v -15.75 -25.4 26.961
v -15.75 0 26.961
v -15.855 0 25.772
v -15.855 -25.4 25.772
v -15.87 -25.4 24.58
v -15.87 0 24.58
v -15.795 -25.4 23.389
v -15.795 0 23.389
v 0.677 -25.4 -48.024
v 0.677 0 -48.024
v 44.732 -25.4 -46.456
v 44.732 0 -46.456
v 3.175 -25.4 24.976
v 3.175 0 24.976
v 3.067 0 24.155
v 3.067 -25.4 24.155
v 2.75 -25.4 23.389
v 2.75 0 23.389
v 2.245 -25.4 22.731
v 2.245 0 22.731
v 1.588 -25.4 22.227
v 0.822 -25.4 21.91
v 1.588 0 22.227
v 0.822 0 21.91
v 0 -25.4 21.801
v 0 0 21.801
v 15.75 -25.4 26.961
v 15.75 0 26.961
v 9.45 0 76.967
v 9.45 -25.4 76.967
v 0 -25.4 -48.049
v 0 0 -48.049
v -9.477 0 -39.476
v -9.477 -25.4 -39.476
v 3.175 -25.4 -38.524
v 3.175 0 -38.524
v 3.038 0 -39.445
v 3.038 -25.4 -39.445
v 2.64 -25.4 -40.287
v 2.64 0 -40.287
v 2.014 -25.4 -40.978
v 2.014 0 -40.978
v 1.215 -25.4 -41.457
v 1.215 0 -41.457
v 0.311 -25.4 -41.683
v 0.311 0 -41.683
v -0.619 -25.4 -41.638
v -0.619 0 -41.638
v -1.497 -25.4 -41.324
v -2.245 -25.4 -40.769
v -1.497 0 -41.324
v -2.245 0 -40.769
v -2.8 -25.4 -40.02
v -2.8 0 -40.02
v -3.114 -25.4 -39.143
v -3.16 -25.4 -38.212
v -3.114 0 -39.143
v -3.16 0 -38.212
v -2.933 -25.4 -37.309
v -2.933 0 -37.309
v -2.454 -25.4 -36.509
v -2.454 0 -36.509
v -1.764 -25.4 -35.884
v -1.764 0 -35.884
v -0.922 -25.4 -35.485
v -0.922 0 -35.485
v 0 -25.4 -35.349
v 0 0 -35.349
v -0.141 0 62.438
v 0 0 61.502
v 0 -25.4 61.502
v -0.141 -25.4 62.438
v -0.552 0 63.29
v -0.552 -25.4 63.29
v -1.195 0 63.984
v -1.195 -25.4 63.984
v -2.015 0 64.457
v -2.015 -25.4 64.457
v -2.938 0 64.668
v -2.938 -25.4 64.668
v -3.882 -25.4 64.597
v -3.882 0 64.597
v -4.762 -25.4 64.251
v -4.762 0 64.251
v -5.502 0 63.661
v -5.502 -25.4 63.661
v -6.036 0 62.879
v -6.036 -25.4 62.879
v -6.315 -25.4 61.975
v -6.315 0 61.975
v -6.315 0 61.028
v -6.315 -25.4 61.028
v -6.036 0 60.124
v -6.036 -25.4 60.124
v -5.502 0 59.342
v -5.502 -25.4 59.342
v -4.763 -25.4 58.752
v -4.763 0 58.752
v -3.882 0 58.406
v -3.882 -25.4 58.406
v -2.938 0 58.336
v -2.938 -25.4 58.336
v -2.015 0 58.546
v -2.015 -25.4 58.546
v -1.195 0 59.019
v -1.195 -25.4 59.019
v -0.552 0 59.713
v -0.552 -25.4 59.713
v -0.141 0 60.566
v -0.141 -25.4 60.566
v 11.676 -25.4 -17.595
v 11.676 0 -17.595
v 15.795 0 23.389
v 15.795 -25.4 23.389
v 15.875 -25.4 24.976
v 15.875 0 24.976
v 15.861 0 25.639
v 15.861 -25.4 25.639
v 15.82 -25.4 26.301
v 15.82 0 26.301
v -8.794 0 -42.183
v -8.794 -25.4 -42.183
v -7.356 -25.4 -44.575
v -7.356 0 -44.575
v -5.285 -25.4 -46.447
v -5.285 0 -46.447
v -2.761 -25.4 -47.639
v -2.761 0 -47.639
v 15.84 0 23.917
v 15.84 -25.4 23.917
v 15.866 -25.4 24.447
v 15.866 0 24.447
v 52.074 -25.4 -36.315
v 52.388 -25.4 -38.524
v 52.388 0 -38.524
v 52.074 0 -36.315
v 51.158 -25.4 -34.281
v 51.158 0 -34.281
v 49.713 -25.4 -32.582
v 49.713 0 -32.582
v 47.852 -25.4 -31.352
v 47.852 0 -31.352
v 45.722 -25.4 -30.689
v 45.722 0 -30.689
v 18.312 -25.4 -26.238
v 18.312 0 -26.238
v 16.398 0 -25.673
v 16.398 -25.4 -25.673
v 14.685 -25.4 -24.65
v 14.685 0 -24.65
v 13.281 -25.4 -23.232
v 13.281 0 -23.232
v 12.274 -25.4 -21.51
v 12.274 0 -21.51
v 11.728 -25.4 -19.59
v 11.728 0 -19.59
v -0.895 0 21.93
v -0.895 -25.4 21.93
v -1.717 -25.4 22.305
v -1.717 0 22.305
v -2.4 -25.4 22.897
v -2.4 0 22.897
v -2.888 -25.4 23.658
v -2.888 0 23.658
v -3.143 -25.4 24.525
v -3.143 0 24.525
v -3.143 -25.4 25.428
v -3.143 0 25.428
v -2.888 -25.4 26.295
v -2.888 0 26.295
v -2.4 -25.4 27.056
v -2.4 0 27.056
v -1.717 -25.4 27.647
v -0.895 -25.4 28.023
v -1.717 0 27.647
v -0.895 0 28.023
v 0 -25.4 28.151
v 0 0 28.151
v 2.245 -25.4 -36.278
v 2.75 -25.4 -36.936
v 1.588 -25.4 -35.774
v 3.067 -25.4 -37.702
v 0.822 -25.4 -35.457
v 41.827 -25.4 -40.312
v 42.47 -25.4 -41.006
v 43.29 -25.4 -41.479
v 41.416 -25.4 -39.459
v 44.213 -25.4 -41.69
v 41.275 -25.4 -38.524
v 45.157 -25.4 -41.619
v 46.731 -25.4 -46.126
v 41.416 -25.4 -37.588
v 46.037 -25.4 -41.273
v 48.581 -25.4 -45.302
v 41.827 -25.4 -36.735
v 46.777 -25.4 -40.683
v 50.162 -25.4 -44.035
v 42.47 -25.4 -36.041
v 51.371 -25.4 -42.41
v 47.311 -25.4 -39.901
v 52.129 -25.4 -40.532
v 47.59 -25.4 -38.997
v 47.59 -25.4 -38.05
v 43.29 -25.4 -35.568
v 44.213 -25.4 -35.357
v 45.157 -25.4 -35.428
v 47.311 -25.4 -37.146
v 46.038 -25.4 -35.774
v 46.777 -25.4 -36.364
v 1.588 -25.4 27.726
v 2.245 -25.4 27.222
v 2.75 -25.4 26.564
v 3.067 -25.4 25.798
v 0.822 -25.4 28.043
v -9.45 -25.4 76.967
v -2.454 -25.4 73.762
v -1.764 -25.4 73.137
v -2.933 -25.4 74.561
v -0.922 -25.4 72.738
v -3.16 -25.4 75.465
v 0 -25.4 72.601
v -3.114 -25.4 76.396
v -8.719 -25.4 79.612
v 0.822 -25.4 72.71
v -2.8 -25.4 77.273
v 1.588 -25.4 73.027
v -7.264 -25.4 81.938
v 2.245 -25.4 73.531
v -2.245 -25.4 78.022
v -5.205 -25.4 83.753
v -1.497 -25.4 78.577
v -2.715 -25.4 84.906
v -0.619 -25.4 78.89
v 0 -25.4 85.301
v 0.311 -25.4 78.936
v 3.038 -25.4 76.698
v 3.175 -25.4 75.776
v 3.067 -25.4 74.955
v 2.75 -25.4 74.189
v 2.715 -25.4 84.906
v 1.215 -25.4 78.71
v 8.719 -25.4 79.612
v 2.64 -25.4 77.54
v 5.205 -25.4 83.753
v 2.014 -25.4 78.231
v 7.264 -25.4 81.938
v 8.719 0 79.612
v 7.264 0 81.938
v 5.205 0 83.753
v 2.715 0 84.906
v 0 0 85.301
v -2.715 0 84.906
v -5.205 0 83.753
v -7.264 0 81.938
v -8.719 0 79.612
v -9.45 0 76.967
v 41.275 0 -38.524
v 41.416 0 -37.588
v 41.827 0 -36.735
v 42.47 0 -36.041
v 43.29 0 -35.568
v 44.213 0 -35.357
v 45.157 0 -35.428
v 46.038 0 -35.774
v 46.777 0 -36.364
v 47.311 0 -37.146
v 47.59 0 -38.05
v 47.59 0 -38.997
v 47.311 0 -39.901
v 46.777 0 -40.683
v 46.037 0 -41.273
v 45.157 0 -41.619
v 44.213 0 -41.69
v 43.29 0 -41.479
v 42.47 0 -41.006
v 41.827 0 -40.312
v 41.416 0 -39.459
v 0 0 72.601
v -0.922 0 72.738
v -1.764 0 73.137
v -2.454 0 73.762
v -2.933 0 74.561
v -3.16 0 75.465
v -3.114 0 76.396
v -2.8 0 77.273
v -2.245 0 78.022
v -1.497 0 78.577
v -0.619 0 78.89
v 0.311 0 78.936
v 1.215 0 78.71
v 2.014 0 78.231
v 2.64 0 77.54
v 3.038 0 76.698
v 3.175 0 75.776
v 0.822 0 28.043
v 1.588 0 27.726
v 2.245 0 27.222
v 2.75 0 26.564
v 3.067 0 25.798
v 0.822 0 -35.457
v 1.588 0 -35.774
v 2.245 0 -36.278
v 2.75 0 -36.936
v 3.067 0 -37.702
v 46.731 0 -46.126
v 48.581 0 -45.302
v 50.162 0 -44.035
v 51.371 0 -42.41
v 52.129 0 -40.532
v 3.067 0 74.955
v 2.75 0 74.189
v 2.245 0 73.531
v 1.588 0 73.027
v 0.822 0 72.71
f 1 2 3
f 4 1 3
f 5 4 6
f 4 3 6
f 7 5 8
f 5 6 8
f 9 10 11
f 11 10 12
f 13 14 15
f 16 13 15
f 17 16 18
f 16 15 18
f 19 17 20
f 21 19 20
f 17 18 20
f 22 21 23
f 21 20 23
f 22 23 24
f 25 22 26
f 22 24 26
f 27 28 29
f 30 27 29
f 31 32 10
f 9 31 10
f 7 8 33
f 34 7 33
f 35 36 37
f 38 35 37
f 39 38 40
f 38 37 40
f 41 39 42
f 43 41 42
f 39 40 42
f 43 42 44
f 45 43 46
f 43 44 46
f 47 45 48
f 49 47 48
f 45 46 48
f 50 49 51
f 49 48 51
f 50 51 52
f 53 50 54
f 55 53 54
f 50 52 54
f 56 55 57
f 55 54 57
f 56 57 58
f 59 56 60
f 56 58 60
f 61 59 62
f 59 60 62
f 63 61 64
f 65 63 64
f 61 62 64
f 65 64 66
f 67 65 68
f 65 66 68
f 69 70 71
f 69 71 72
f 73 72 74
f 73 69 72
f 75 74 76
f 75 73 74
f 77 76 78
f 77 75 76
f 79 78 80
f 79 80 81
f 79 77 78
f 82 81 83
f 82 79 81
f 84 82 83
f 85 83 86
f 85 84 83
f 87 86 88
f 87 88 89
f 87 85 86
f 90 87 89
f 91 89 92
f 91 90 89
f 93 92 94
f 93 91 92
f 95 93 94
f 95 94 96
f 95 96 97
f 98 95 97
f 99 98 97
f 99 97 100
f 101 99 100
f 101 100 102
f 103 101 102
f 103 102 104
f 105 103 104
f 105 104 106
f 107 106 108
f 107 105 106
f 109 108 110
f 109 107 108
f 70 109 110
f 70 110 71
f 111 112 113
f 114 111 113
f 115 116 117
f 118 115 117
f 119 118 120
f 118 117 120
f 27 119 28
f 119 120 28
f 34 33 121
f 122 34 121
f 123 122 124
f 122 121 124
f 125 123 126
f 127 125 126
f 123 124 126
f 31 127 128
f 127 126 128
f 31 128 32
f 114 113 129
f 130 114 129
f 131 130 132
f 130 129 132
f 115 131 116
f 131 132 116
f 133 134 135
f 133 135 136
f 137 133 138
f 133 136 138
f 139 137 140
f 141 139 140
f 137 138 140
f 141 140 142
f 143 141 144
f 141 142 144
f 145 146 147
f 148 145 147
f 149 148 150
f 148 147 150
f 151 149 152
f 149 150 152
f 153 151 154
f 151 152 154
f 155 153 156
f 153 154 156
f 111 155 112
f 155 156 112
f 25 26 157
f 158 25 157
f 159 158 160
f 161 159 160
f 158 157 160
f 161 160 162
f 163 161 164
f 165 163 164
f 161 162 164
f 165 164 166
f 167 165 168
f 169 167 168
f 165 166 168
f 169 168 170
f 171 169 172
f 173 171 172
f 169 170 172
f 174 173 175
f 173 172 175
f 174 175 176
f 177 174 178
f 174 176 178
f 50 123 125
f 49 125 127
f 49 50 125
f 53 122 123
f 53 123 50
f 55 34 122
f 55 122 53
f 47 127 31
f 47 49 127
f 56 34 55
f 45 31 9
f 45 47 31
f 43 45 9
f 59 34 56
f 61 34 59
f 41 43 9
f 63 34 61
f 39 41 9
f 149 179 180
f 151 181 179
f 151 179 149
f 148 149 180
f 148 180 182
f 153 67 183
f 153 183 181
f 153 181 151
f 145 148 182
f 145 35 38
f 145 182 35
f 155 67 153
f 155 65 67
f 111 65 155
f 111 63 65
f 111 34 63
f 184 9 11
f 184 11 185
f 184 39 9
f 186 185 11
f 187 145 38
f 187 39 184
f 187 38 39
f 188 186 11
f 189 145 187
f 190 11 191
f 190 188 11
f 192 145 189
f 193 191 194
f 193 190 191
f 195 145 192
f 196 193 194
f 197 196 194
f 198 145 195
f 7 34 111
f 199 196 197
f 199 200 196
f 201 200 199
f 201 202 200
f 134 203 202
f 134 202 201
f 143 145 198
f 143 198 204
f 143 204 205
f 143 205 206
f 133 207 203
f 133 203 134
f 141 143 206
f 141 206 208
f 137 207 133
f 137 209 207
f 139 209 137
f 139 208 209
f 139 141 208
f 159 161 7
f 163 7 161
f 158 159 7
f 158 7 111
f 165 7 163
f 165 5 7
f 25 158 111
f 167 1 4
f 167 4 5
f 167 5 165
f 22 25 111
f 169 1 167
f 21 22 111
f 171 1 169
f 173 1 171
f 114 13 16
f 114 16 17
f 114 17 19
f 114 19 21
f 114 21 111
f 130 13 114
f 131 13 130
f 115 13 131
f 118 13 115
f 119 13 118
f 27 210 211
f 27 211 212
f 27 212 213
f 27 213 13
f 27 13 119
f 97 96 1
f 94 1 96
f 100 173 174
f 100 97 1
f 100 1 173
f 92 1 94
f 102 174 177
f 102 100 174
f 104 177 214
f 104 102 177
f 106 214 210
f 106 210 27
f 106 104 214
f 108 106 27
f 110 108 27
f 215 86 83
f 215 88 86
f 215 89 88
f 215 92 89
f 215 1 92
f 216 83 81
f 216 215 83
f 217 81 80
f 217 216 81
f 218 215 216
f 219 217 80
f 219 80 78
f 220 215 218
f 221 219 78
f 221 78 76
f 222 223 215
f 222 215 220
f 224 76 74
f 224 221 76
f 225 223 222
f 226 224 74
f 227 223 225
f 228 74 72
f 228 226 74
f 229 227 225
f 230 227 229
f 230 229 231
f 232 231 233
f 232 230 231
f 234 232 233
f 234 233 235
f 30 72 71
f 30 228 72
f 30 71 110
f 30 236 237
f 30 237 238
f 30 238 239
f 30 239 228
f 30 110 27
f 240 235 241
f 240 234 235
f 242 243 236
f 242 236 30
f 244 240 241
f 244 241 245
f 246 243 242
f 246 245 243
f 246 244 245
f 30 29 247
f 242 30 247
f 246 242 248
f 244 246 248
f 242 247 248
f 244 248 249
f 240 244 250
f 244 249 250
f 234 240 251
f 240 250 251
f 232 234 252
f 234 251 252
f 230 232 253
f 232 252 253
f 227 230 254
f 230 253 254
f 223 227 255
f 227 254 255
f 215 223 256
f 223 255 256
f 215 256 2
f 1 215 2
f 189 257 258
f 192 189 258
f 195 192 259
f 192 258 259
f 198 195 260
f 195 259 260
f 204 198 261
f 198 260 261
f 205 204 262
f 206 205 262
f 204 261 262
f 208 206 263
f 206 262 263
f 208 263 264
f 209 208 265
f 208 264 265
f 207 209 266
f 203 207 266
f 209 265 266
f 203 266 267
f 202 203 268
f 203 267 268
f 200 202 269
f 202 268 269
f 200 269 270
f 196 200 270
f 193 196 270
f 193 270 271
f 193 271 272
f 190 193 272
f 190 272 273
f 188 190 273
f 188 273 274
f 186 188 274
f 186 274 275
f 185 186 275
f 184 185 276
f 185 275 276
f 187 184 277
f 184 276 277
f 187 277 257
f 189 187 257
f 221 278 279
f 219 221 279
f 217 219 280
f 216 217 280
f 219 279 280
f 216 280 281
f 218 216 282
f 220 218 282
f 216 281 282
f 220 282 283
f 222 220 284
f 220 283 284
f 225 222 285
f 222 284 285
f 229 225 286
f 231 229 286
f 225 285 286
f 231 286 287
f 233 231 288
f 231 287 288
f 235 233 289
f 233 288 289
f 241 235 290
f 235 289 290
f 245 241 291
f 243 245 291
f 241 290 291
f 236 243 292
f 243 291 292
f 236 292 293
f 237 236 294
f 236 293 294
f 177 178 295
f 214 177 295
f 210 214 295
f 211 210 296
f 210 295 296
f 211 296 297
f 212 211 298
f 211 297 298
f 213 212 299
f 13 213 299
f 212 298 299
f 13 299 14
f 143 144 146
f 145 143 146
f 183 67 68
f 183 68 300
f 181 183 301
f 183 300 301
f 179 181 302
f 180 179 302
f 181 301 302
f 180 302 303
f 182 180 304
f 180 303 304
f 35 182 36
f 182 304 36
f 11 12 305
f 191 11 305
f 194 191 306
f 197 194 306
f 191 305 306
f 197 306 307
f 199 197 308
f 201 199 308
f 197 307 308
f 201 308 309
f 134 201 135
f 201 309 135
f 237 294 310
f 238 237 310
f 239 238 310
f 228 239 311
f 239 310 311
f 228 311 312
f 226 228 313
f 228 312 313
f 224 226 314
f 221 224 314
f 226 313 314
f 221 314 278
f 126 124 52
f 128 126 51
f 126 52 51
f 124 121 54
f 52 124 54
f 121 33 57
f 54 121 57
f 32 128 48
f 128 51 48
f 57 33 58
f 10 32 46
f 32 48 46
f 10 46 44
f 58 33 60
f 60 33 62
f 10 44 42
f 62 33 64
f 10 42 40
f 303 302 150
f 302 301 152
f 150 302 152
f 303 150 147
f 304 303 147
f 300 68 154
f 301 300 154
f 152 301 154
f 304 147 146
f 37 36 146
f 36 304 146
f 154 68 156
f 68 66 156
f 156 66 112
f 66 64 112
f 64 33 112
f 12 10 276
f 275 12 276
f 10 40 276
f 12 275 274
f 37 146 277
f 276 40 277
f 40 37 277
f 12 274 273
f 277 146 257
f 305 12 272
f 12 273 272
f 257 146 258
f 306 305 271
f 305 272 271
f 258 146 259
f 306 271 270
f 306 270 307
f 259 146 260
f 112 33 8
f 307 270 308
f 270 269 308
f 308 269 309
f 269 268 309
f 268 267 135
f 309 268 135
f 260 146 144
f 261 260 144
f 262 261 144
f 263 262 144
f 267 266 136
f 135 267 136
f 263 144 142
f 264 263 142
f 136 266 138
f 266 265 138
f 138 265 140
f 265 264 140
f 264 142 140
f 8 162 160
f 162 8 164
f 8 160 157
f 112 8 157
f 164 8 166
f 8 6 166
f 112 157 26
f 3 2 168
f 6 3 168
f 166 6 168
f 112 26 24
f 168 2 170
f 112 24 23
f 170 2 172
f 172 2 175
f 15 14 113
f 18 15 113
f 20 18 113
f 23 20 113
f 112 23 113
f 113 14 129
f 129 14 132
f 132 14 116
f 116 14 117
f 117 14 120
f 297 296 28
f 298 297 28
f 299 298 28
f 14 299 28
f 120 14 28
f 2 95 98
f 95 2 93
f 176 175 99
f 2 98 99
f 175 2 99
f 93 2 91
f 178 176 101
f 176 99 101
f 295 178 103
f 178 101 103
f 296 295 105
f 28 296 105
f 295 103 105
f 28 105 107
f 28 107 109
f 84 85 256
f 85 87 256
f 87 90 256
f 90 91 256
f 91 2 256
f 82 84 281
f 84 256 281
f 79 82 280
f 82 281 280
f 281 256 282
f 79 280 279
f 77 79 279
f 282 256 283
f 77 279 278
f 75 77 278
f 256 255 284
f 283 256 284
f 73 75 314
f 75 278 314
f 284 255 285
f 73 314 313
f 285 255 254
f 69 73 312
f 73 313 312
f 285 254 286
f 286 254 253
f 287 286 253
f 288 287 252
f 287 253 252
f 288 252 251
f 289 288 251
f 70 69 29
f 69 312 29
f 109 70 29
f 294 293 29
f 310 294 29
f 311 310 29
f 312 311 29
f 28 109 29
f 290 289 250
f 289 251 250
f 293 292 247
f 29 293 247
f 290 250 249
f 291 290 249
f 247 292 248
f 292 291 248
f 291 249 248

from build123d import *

# Parameters (mm, degrees)
F0_R     = 3.175
F1_DEPTH = 25.4


# Not quite as in the source:
# - a feature of the source that left no trace in its solid (it failed there, or was rolled back) is left out


with BuildPart() as f1:
    # F0 (on Front) → F1 (new body)
    with BuildSketch(Plane.XZ):
        with BuildLine():
            ThreePointArc((9.525, 75.7764706288), (6.7351920908, 69.041278538), (0, 66.2514706288))
            Line((0, 66.2514706288), (0, 61.5016706288))
            Line((0, 61.5016706288), (0, 40.8514706288))
            ThreePointArc((0, 40.8514706288), (10.5003255158, 36.8827206288), (15.7504882737, 26.9608456288))
            Line((15.7504882737, 26.9608456288), (9.4502929642, 76.9670956288))
            ThreePointArc((9.4502929642, 76.9670956288), (9.5063048942, 76.3729538708), (9.525, 75.7764706288))
        make_face()
        with BuildLine():
            ThreePointArc((-9.4502929642, 76.9670956288), (-7.14375, 69.4762753193), (0, 66.2514706288))
            ThreePointArc((0, 66.2514706288), (6.7351920908, 69.041278538), (9.525, 75.7764706288))
            ThreePointArc((9.525, 75.7764706288), (9.5063048942, 76.3729538708), (9.4502929642, 76.9670956288))
            ThreePointArc((9.4502929642, 76.9670956288), (0, 85.3014706288), (-9.4502929642, 76.9670956288))
        make_face()
        with BuildLine():
            ThreePointArc((3.175, 75.7764706288), (2.2450640303, 73.5314065985), (0, 72.6014706288))
            ThreePointArc((0, 72.6014706288), (-2.2450640303, 78.0215346591), (3.175, 75.7764706288))
        make_face(mode=Mode.SUBTRACT)
        with BuildLine():
            Line((0, 61.5016706288), (0, 66.2514706288))
            ThreePointArc((0, 66.2514706288), (-7.14375, 69.4762753193), (-9.4502929642, 76.9670956288))
            Line((-9.4502929642, 76.9670956288), (-15.7504882737, 26.9608456288))
            ThreePointArc((-15.7504882737, 26.9608456288), (-10.5003255158, 36.8827206288), (0, 40.8514706288))
            Line((0, 40.8514706288), (0, 61.5016706288))
        make_face()
        with Locations((-3.175, 61.5016706288)):
            Circle(F0_R, mode=Mode.SUBTRACT)
        with BuildLine():
            Line((0, 28.1514706288), (0, 40.8514706288))
            ThreePointArc((0, 40.8514706288), (-10.5003255158, 36.8827206288), (-15.7504882737, 26.9608456288))
            ThreePointArc((-15.7504882737, 26.9608456288), (-15.8737438155, 25.1761761155), (-15.7954255641, 23.3889706288))
            ThreePointArc((-15.7954255641, 23.3889706288), (-10.6492737428, 13.2032555305), (0, 9.1014706288))
            Line((0, 9.1014706288), (0, 21.8014706288))
            ThreePointArc((0, 21.8014706288), (-3.175, 24.9764706288), (0, 28.1514706288))
        make_face()
        with BuildLine():
            ThreePointArc((15.7504882737, 26.9608456288), (10.5003255158, 36.8827206288), (0, 40.8514706288))
            Line((0, 40.8514706288), (0, 28.1514706288))
            ThreePointArc((0, 28.1514706288), (2.2450640303, 27.2215346591), (3.175, 24.9764706288))
            ThreePointArc((3.175, 24.9764706288), (2.2450640303, 22.7314065985), (0, 21.8014706288))
            Line((0, 21.8014706288), (0, 9.1014706288))
            ThreePointArc((0, 9.1014706288), (10.6492737428, 13.2032555305), (15.7954255641, 23.3889706288))
            ThreePointArc((15.7954255641, 23.3889706288), (15.8550939106, 24.1817240747), (15.875, 24.9764706288))
            ThreePointArc((15.875, 24.9764706288), (15.8438414904, 25.9706093654), (15.7504882737, 26.9608456288))
        make_face()
        with BuildLine():
            ThreePointArc((0, 9.1014706288), (-10.6492737428, 13.2032555305), (-15.7954255641, 23.3889706288))
            Line((-15.7954255641, 23.3889706288), (-9.4772553384, -39.4760293712))
            ThreePointArc((-9.4772553384, -39.4760293712), (-7.063929059, -32.1339651255), (0, -28.9985293712))
            Line((0, -28.9985293712), (0, 9.1014706288))
        make_face()
        with BuildLine():
            ThreePointArc((15.7954255641, 23.3889706288), (10.6492737428, 13.2032555305), (0, 9.1014706288))
            Line((0, 9.1014706288), (0, -28.9985293712))
            ThreePointArc((0, -28.9985293712), (6.7351920908, -31.7883372804), (9.525, -38.5235293712))
            Line((9.525, -38.5235293712), (36.5125, -38.5235293712))
            ThreePointArc((36.5125, -38.5235293712), (39.3067692229, -32.4777801684), (45.7222218075, -30.6886485219))
            Line((45.7222218075, -30.6886485219), (18.312429941, -26.2378680158))
            ThreePointArc((18.312429941, -26.2378680158), (13.2809615783, -23.2323004998), (11.6763381809, -17.5954313572))
            Line((11.6763381809, -17.5954313572), (15.7954255641, 23.3889706288))
        make_face()
        with BuildLine():
            Line((36.5125, -38.5235293712), (9.525, -38.5235293712))
            ThreePointArc((9.525, -38.5235293712), (6.9705567315, -45.0148284595), (0.6773435479, -48.0244151572))
            Line((0.6773435479, -48.0244151572), (44.7324052746, -46.4560039858))
            ThreePointArc((44.7324052746, -46.4560039858), (38.9380895153, -44.2351621551), (36.5125, -38.5235293712))
        make_face()
        with BuildLine():
            ThreePointArc((0, -28.9985293712), (-7.063929059, -32.1339651255), (-9.4772553384, -39.4760293712))
            ThreePointArc((-9.4772553384, -39.4760293712), (-6.3895642457, -45.5874584302), (0, -48.0485293712))
            Line((0, -48.0485293712), (0.6773435479, -48.0244151572))
            ThreePointArc((0.6773435479, -48.0244151572), (6.9705567315, -45.0148284595), (9.525, -38.5235293712))
            Line((9.525, -38.5235293712), (3.175, -38.5235293712))
            ThreePointArc((3.175, -38.5235293712), (-2.2450640303, -40.7685934015), (0, -35.3485293712))
            Line((0, -35.3485293712), (0, -28.9985293712))
        make_face()
        with BuildLine():
            ThreePointArc((9.525, -38.5235293712), (6.7351920908, -31.7883372804), (0, -28.9985293712))
            Line((0, -28.9985293712), (0, -35.3485293712))
            ThreePointArc((0, -35.3485293712), (2.2450640303, -36.2784653409), (3.175, -38.5235293712))
            Line((3.175, -38.5235293712), (9.525, -38.5235293712))
        make_face()
        with BuildLine():
            ThreePointArc((45.7222218075, -30.6886485219), (39.3067692229, -32.4777801684), (36.5125, -38.5235293712))
            ThreePointArc((36.5125, -38.5235293712), (38.9380895153, -44.2351621551), (44.7324052746, -46.4560039858))
            ThreePointArc((44.7324052746, -46.4560039858), (50.1616327839, -44.0354398559), (52.3875, -38.5235293712))
            ThreePointArc((52.3875, -38.5235293712), (50.4957492028, -33.3802985941), (45.7222218075, -30.6886485219))
        make_face()
        with BuildLine():
            ThreePointArc((47.625, -38.5235293712), (44.45, -41.6985293712), (41.275, -38.5235293712))
            ThreePointArc((41.275, -38.5235293712), (44.45, -35.3485293712), (47.625, -38.5235293712))
        make_face(mode=Mode.SUBTRACT)
    extrude(amount=F1_DEPTH)


solid = f1.part
